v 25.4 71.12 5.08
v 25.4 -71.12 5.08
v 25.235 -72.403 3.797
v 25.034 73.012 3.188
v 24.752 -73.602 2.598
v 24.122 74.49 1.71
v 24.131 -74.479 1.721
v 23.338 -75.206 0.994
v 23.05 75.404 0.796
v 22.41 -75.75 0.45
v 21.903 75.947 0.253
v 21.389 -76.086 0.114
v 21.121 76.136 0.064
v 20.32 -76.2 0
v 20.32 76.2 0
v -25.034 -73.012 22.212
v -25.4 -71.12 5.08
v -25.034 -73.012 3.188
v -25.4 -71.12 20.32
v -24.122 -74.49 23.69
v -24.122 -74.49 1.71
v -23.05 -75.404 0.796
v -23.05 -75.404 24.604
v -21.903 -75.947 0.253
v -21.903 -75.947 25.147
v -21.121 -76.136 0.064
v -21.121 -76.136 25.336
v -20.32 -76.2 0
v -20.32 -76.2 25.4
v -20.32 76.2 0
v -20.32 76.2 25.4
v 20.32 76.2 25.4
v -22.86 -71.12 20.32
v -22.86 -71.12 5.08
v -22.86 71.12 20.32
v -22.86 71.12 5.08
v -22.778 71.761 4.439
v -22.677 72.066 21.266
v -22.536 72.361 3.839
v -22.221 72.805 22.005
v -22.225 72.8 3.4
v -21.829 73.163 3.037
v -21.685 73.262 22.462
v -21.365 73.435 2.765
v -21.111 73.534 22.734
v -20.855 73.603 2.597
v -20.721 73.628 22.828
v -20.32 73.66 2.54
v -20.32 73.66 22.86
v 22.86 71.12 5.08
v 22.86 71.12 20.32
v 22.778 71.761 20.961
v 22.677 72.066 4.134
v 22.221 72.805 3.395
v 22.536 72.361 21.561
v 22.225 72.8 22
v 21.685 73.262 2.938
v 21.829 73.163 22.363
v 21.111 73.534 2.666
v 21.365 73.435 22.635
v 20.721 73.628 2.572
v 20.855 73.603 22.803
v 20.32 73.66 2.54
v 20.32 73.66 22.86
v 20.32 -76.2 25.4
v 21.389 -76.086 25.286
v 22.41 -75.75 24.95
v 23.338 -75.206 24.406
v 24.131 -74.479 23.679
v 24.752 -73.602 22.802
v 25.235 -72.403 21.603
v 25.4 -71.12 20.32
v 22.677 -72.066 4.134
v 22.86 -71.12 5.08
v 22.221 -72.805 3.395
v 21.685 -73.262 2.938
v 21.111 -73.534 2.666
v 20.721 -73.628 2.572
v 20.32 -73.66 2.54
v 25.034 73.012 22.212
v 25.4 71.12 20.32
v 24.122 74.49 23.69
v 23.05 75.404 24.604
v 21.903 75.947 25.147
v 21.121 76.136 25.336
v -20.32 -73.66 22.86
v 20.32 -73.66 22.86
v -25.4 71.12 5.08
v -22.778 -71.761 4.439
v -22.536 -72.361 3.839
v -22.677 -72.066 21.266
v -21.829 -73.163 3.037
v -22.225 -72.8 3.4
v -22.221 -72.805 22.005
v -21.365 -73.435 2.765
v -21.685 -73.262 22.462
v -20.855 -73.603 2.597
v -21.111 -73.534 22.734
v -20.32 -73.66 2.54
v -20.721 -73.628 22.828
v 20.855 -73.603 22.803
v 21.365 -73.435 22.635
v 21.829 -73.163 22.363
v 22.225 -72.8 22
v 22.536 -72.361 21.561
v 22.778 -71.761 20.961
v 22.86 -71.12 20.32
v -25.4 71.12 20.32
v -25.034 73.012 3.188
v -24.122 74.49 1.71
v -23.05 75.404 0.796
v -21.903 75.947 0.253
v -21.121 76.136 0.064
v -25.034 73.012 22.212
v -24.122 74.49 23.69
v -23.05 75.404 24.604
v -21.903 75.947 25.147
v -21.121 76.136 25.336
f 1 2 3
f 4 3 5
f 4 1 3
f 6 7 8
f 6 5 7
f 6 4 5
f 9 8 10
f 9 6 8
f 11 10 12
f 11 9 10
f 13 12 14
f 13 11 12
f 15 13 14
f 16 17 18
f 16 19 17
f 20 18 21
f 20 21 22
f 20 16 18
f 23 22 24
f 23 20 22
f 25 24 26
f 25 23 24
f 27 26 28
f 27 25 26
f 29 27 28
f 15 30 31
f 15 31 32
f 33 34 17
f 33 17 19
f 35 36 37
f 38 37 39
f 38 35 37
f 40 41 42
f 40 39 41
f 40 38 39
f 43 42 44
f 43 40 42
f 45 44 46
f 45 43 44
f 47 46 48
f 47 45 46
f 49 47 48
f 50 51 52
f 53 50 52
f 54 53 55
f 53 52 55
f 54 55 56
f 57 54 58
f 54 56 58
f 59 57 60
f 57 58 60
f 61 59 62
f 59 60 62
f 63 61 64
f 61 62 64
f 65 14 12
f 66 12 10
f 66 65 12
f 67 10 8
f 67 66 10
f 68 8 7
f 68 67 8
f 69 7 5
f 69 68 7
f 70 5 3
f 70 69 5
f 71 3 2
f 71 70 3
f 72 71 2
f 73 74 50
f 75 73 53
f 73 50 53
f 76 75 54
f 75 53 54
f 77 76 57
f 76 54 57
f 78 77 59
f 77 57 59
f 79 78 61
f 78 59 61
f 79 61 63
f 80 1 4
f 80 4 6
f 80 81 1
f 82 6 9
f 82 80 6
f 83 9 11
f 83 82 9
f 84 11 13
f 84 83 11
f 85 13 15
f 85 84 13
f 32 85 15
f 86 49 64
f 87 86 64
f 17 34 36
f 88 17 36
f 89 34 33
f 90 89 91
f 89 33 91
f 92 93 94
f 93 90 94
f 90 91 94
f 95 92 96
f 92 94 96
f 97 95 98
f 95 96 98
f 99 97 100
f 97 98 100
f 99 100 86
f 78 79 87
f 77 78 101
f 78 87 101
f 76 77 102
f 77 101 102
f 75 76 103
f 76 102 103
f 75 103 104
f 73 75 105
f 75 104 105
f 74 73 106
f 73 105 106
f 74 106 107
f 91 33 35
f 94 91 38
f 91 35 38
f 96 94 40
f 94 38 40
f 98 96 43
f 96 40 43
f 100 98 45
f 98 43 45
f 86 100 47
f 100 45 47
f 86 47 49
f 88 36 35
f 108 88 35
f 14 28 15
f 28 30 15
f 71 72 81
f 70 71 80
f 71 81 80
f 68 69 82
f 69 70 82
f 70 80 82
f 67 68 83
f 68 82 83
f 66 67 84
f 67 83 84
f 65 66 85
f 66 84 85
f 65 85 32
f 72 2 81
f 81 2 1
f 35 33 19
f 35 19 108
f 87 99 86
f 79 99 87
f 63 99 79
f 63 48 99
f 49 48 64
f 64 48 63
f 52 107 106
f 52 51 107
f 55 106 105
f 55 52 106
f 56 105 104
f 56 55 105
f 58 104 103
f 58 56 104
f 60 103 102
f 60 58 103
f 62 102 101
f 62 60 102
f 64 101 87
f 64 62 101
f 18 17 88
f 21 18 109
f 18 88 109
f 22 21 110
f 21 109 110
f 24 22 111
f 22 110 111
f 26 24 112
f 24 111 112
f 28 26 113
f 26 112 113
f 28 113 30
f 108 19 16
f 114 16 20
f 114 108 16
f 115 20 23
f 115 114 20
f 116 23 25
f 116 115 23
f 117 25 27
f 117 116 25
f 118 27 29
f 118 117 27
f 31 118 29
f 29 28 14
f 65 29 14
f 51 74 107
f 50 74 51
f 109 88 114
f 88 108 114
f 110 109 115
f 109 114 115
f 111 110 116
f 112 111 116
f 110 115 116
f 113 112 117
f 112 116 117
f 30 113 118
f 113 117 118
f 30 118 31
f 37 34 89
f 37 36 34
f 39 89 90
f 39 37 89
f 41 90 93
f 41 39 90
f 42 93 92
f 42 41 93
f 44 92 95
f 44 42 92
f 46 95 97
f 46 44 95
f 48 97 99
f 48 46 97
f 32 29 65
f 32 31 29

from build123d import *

# Parameters (mm, degrees)
F0_W     = 50.8
F0_H     = 152.4
F1_DEPTH = 25.4
F2_R     = 5.08
F3_T     = -2.54


# Not quite as in the source:
# - a shell that OpenCascade refuses in one call is made with other operations: the cavity is built on its own and cut out


with BuildPart() as f1:
    # F0 (on Top) → F1 (new body)
    with BuildSketch(Plane.XY):
        Rectangle(F0_W, F0_H)
    extrude(amount=F1_DEPTH)

    # F2
    f2_edges = [f1.edges().sort_by_distance(p)[0] for p in [
        (-25.4, 76.2, 12.7),
        (25.4, 76.2, 12.7),
        (-25.4, -76.2, 12.7),
        (25.4, -76.2, 12.7),
        (25.4, 0, 25.4),
        (25.4, 0, 0),
        (-25.4, 0, 25.4),
        (-25.4, 0, 0),
    ]]
    fillet(f2_edges, radius=F2_R)

    # F3: a shell. OpenCascade refuses it in one call, so the cavity is built on its own and cut out:
    # the body offset inwards by the wall thickness, plus a prism from it out through each open face.
    f3_core = offset(f1.part, amount=F3_T, mode=Mode.PRIVATE)
    f3_exits = [f3_core.faces().sort_by_distance(p)[0] for p in [
        (-22.86, 0, 12.7),
    ]]
    add(f3_core, mode=Mode.SUBTRACT)
    extrude(f3_exits, amount=-F3_T, mode=Mode.SUBTRACT)


solid = f1.part
